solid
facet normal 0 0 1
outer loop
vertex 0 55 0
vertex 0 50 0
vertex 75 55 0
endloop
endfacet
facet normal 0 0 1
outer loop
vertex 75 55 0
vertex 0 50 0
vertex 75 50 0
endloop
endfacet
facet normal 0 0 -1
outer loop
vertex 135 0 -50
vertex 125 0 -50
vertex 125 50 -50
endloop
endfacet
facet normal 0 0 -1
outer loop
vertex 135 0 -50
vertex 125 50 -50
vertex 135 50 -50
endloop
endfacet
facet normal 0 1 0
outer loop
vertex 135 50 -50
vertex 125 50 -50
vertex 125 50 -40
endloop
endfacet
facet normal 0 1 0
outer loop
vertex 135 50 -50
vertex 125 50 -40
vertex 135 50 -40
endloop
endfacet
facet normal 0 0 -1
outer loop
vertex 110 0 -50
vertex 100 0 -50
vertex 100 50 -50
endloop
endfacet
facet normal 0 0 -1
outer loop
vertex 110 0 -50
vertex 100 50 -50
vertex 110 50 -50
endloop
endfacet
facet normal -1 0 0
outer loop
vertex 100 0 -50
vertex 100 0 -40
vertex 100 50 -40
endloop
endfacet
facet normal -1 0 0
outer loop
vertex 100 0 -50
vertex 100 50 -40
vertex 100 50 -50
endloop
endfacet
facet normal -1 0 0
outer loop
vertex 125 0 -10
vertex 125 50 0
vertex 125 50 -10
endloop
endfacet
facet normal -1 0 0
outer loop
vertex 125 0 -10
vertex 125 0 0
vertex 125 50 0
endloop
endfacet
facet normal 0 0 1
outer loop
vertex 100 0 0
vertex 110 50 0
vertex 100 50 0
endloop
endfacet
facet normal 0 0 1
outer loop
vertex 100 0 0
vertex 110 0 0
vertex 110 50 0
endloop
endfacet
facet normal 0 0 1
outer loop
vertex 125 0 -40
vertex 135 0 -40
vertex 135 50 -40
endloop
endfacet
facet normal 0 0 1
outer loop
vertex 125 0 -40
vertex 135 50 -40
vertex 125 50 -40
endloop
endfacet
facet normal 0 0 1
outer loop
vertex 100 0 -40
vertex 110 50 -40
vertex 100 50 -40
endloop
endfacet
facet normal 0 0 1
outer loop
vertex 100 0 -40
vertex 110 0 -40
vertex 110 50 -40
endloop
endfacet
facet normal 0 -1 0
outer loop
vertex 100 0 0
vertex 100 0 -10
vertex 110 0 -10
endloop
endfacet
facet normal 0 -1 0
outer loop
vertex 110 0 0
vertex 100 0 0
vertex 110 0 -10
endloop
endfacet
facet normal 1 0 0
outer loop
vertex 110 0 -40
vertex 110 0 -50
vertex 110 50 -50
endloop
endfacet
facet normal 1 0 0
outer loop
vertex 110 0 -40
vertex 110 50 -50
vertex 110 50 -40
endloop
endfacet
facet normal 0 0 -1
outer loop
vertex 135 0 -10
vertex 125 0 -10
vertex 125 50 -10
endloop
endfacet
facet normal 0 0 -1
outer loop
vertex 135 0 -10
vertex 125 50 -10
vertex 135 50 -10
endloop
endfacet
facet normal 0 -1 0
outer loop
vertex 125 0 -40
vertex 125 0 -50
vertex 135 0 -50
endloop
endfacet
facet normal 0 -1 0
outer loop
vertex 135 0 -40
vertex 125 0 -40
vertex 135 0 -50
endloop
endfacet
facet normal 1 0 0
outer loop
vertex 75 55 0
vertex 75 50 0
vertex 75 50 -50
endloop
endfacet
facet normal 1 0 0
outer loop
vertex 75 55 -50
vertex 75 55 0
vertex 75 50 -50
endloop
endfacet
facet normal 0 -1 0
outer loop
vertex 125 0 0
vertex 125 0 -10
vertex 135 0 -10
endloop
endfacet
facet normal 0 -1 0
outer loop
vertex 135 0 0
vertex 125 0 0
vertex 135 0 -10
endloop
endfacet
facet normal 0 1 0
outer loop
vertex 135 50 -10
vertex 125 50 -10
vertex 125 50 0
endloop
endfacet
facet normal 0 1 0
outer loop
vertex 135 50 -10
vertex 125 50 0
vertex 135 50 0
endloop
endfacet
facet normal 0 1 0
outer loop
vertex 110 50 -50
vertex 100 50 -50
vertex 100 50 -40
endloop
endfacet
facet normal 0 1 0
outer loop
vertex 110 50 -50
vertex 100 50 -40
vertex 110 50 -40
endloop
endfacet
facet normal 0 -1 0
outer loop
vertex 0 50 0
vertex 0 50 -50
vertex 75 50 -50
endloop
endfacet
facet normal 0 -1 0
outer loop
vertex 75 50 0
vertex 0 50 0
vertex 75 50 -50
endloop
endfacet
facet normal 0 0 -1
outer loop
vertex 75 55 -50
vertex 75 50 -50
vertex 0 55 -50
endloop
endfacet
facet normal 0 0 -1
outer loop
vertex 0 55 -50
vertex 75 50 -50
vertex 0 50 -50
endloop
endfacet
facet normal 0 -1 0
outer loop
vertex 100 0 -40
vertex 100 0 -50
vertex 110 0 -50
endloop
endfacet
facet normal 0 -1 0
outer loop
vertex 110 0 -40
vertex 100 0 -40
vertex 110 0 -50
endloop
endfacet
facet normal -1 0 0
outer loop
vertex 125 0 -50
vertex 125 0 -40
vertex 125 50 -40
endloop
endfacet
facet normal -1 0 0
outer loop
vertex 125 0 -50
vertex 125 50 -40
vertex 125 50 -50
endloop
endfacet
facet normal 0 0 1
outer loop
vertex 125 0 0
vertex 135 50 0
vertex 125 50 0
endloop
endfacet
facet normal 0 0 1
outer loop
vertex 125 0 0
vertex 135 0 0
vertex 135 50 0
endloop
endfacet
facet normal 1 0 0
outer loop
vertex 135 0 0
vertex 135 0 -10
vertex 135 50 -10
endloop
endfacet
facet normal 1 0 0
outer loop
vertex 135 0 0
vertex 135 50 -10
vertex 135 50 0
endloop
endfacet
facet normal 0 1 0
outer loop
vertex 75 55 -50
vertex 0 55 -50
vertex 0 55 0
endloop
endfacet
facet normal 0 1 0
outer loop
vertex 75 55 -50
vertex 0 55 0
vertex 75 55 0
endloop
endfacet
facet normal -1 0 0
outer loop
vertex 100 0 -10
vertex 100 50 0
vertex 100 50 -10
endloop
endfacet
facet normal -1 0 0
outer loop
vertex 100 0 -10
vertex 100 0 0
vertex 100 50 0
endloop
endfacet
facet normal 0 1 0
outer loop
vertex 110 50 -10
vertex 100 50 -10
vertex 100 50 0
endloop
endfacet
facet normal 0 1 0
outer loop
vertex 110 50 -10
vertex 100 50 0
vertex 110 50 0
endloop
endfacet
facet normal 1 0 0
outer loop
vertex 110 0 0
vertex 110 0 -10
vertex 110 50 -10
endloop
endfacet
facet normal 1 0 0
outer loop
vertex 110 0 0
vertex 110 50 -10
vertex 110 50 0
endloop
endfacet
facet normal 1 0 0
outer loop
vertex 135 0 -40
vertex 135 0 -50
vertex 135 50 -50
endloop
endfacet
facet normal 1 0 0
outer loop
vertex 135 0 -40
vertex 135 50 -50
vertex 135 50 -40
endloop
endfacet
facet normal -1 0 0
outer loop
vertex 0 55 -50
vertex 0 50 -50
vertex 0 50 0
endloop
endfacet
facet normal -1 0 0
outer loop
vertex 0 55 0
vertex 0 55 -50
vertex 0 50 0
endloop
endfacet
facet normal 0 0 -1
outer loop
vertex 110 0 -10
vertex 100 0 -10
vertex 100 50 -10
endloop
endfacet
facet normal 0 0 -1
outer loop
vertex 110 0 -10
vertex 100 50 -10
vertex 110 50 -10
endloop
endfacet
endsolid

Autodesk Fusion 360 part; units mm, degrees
sketch "スケッチ1" plane through (0, 0, 0) normal (0, 1, 0) x (1, 0, 0)
  line L0 (0, 0) -> (75, 0)
  line L1 (75, 0) -> (75, 50)
  line L2 (75, 50) -> (0, 50)
  line L3 (0, 50) -> (0, 0)
  line L4 (100, 10) -> (110, 10)
  line L5 (110, 10) -> (110, 0)
  line L6 (110, 0) -> (100, 0)
  line L7 (100, 0) -> (100, 10)
extrude "押し出し1" add sketch "スケッチ1" along normal blind 5 from surface at 50 contours L0 L1 L2 L3 makes body 1 in component "天板"
extrude "押し出し1'" add sketch "スケッチ1" along normal blind 50 separate body contours L4 L5 L6 L7 makes body 2 in component "足"
component "天板" placed x (1, 0, 0) y (0, 1, 0) z (0, 0, 1) at (0, 0, 0)
component "足" placed x (1, 0, 0) y (0, 1, 0) z (0, 0, 1) at (0, 0, 0)
component "足" placed x (1, 0, 0) y (0, 1, 0) z (0, 0, 1) at (25, 0, 0)
component "足" placed x (1, 0, 0) y (0, 1, 0) z (0, 0, 1) at (0, 0, -40)
component "足" placed x (1, 0, 0) y (0, 1, 0) z (0, 0, 1) at (25, 0, -40)
